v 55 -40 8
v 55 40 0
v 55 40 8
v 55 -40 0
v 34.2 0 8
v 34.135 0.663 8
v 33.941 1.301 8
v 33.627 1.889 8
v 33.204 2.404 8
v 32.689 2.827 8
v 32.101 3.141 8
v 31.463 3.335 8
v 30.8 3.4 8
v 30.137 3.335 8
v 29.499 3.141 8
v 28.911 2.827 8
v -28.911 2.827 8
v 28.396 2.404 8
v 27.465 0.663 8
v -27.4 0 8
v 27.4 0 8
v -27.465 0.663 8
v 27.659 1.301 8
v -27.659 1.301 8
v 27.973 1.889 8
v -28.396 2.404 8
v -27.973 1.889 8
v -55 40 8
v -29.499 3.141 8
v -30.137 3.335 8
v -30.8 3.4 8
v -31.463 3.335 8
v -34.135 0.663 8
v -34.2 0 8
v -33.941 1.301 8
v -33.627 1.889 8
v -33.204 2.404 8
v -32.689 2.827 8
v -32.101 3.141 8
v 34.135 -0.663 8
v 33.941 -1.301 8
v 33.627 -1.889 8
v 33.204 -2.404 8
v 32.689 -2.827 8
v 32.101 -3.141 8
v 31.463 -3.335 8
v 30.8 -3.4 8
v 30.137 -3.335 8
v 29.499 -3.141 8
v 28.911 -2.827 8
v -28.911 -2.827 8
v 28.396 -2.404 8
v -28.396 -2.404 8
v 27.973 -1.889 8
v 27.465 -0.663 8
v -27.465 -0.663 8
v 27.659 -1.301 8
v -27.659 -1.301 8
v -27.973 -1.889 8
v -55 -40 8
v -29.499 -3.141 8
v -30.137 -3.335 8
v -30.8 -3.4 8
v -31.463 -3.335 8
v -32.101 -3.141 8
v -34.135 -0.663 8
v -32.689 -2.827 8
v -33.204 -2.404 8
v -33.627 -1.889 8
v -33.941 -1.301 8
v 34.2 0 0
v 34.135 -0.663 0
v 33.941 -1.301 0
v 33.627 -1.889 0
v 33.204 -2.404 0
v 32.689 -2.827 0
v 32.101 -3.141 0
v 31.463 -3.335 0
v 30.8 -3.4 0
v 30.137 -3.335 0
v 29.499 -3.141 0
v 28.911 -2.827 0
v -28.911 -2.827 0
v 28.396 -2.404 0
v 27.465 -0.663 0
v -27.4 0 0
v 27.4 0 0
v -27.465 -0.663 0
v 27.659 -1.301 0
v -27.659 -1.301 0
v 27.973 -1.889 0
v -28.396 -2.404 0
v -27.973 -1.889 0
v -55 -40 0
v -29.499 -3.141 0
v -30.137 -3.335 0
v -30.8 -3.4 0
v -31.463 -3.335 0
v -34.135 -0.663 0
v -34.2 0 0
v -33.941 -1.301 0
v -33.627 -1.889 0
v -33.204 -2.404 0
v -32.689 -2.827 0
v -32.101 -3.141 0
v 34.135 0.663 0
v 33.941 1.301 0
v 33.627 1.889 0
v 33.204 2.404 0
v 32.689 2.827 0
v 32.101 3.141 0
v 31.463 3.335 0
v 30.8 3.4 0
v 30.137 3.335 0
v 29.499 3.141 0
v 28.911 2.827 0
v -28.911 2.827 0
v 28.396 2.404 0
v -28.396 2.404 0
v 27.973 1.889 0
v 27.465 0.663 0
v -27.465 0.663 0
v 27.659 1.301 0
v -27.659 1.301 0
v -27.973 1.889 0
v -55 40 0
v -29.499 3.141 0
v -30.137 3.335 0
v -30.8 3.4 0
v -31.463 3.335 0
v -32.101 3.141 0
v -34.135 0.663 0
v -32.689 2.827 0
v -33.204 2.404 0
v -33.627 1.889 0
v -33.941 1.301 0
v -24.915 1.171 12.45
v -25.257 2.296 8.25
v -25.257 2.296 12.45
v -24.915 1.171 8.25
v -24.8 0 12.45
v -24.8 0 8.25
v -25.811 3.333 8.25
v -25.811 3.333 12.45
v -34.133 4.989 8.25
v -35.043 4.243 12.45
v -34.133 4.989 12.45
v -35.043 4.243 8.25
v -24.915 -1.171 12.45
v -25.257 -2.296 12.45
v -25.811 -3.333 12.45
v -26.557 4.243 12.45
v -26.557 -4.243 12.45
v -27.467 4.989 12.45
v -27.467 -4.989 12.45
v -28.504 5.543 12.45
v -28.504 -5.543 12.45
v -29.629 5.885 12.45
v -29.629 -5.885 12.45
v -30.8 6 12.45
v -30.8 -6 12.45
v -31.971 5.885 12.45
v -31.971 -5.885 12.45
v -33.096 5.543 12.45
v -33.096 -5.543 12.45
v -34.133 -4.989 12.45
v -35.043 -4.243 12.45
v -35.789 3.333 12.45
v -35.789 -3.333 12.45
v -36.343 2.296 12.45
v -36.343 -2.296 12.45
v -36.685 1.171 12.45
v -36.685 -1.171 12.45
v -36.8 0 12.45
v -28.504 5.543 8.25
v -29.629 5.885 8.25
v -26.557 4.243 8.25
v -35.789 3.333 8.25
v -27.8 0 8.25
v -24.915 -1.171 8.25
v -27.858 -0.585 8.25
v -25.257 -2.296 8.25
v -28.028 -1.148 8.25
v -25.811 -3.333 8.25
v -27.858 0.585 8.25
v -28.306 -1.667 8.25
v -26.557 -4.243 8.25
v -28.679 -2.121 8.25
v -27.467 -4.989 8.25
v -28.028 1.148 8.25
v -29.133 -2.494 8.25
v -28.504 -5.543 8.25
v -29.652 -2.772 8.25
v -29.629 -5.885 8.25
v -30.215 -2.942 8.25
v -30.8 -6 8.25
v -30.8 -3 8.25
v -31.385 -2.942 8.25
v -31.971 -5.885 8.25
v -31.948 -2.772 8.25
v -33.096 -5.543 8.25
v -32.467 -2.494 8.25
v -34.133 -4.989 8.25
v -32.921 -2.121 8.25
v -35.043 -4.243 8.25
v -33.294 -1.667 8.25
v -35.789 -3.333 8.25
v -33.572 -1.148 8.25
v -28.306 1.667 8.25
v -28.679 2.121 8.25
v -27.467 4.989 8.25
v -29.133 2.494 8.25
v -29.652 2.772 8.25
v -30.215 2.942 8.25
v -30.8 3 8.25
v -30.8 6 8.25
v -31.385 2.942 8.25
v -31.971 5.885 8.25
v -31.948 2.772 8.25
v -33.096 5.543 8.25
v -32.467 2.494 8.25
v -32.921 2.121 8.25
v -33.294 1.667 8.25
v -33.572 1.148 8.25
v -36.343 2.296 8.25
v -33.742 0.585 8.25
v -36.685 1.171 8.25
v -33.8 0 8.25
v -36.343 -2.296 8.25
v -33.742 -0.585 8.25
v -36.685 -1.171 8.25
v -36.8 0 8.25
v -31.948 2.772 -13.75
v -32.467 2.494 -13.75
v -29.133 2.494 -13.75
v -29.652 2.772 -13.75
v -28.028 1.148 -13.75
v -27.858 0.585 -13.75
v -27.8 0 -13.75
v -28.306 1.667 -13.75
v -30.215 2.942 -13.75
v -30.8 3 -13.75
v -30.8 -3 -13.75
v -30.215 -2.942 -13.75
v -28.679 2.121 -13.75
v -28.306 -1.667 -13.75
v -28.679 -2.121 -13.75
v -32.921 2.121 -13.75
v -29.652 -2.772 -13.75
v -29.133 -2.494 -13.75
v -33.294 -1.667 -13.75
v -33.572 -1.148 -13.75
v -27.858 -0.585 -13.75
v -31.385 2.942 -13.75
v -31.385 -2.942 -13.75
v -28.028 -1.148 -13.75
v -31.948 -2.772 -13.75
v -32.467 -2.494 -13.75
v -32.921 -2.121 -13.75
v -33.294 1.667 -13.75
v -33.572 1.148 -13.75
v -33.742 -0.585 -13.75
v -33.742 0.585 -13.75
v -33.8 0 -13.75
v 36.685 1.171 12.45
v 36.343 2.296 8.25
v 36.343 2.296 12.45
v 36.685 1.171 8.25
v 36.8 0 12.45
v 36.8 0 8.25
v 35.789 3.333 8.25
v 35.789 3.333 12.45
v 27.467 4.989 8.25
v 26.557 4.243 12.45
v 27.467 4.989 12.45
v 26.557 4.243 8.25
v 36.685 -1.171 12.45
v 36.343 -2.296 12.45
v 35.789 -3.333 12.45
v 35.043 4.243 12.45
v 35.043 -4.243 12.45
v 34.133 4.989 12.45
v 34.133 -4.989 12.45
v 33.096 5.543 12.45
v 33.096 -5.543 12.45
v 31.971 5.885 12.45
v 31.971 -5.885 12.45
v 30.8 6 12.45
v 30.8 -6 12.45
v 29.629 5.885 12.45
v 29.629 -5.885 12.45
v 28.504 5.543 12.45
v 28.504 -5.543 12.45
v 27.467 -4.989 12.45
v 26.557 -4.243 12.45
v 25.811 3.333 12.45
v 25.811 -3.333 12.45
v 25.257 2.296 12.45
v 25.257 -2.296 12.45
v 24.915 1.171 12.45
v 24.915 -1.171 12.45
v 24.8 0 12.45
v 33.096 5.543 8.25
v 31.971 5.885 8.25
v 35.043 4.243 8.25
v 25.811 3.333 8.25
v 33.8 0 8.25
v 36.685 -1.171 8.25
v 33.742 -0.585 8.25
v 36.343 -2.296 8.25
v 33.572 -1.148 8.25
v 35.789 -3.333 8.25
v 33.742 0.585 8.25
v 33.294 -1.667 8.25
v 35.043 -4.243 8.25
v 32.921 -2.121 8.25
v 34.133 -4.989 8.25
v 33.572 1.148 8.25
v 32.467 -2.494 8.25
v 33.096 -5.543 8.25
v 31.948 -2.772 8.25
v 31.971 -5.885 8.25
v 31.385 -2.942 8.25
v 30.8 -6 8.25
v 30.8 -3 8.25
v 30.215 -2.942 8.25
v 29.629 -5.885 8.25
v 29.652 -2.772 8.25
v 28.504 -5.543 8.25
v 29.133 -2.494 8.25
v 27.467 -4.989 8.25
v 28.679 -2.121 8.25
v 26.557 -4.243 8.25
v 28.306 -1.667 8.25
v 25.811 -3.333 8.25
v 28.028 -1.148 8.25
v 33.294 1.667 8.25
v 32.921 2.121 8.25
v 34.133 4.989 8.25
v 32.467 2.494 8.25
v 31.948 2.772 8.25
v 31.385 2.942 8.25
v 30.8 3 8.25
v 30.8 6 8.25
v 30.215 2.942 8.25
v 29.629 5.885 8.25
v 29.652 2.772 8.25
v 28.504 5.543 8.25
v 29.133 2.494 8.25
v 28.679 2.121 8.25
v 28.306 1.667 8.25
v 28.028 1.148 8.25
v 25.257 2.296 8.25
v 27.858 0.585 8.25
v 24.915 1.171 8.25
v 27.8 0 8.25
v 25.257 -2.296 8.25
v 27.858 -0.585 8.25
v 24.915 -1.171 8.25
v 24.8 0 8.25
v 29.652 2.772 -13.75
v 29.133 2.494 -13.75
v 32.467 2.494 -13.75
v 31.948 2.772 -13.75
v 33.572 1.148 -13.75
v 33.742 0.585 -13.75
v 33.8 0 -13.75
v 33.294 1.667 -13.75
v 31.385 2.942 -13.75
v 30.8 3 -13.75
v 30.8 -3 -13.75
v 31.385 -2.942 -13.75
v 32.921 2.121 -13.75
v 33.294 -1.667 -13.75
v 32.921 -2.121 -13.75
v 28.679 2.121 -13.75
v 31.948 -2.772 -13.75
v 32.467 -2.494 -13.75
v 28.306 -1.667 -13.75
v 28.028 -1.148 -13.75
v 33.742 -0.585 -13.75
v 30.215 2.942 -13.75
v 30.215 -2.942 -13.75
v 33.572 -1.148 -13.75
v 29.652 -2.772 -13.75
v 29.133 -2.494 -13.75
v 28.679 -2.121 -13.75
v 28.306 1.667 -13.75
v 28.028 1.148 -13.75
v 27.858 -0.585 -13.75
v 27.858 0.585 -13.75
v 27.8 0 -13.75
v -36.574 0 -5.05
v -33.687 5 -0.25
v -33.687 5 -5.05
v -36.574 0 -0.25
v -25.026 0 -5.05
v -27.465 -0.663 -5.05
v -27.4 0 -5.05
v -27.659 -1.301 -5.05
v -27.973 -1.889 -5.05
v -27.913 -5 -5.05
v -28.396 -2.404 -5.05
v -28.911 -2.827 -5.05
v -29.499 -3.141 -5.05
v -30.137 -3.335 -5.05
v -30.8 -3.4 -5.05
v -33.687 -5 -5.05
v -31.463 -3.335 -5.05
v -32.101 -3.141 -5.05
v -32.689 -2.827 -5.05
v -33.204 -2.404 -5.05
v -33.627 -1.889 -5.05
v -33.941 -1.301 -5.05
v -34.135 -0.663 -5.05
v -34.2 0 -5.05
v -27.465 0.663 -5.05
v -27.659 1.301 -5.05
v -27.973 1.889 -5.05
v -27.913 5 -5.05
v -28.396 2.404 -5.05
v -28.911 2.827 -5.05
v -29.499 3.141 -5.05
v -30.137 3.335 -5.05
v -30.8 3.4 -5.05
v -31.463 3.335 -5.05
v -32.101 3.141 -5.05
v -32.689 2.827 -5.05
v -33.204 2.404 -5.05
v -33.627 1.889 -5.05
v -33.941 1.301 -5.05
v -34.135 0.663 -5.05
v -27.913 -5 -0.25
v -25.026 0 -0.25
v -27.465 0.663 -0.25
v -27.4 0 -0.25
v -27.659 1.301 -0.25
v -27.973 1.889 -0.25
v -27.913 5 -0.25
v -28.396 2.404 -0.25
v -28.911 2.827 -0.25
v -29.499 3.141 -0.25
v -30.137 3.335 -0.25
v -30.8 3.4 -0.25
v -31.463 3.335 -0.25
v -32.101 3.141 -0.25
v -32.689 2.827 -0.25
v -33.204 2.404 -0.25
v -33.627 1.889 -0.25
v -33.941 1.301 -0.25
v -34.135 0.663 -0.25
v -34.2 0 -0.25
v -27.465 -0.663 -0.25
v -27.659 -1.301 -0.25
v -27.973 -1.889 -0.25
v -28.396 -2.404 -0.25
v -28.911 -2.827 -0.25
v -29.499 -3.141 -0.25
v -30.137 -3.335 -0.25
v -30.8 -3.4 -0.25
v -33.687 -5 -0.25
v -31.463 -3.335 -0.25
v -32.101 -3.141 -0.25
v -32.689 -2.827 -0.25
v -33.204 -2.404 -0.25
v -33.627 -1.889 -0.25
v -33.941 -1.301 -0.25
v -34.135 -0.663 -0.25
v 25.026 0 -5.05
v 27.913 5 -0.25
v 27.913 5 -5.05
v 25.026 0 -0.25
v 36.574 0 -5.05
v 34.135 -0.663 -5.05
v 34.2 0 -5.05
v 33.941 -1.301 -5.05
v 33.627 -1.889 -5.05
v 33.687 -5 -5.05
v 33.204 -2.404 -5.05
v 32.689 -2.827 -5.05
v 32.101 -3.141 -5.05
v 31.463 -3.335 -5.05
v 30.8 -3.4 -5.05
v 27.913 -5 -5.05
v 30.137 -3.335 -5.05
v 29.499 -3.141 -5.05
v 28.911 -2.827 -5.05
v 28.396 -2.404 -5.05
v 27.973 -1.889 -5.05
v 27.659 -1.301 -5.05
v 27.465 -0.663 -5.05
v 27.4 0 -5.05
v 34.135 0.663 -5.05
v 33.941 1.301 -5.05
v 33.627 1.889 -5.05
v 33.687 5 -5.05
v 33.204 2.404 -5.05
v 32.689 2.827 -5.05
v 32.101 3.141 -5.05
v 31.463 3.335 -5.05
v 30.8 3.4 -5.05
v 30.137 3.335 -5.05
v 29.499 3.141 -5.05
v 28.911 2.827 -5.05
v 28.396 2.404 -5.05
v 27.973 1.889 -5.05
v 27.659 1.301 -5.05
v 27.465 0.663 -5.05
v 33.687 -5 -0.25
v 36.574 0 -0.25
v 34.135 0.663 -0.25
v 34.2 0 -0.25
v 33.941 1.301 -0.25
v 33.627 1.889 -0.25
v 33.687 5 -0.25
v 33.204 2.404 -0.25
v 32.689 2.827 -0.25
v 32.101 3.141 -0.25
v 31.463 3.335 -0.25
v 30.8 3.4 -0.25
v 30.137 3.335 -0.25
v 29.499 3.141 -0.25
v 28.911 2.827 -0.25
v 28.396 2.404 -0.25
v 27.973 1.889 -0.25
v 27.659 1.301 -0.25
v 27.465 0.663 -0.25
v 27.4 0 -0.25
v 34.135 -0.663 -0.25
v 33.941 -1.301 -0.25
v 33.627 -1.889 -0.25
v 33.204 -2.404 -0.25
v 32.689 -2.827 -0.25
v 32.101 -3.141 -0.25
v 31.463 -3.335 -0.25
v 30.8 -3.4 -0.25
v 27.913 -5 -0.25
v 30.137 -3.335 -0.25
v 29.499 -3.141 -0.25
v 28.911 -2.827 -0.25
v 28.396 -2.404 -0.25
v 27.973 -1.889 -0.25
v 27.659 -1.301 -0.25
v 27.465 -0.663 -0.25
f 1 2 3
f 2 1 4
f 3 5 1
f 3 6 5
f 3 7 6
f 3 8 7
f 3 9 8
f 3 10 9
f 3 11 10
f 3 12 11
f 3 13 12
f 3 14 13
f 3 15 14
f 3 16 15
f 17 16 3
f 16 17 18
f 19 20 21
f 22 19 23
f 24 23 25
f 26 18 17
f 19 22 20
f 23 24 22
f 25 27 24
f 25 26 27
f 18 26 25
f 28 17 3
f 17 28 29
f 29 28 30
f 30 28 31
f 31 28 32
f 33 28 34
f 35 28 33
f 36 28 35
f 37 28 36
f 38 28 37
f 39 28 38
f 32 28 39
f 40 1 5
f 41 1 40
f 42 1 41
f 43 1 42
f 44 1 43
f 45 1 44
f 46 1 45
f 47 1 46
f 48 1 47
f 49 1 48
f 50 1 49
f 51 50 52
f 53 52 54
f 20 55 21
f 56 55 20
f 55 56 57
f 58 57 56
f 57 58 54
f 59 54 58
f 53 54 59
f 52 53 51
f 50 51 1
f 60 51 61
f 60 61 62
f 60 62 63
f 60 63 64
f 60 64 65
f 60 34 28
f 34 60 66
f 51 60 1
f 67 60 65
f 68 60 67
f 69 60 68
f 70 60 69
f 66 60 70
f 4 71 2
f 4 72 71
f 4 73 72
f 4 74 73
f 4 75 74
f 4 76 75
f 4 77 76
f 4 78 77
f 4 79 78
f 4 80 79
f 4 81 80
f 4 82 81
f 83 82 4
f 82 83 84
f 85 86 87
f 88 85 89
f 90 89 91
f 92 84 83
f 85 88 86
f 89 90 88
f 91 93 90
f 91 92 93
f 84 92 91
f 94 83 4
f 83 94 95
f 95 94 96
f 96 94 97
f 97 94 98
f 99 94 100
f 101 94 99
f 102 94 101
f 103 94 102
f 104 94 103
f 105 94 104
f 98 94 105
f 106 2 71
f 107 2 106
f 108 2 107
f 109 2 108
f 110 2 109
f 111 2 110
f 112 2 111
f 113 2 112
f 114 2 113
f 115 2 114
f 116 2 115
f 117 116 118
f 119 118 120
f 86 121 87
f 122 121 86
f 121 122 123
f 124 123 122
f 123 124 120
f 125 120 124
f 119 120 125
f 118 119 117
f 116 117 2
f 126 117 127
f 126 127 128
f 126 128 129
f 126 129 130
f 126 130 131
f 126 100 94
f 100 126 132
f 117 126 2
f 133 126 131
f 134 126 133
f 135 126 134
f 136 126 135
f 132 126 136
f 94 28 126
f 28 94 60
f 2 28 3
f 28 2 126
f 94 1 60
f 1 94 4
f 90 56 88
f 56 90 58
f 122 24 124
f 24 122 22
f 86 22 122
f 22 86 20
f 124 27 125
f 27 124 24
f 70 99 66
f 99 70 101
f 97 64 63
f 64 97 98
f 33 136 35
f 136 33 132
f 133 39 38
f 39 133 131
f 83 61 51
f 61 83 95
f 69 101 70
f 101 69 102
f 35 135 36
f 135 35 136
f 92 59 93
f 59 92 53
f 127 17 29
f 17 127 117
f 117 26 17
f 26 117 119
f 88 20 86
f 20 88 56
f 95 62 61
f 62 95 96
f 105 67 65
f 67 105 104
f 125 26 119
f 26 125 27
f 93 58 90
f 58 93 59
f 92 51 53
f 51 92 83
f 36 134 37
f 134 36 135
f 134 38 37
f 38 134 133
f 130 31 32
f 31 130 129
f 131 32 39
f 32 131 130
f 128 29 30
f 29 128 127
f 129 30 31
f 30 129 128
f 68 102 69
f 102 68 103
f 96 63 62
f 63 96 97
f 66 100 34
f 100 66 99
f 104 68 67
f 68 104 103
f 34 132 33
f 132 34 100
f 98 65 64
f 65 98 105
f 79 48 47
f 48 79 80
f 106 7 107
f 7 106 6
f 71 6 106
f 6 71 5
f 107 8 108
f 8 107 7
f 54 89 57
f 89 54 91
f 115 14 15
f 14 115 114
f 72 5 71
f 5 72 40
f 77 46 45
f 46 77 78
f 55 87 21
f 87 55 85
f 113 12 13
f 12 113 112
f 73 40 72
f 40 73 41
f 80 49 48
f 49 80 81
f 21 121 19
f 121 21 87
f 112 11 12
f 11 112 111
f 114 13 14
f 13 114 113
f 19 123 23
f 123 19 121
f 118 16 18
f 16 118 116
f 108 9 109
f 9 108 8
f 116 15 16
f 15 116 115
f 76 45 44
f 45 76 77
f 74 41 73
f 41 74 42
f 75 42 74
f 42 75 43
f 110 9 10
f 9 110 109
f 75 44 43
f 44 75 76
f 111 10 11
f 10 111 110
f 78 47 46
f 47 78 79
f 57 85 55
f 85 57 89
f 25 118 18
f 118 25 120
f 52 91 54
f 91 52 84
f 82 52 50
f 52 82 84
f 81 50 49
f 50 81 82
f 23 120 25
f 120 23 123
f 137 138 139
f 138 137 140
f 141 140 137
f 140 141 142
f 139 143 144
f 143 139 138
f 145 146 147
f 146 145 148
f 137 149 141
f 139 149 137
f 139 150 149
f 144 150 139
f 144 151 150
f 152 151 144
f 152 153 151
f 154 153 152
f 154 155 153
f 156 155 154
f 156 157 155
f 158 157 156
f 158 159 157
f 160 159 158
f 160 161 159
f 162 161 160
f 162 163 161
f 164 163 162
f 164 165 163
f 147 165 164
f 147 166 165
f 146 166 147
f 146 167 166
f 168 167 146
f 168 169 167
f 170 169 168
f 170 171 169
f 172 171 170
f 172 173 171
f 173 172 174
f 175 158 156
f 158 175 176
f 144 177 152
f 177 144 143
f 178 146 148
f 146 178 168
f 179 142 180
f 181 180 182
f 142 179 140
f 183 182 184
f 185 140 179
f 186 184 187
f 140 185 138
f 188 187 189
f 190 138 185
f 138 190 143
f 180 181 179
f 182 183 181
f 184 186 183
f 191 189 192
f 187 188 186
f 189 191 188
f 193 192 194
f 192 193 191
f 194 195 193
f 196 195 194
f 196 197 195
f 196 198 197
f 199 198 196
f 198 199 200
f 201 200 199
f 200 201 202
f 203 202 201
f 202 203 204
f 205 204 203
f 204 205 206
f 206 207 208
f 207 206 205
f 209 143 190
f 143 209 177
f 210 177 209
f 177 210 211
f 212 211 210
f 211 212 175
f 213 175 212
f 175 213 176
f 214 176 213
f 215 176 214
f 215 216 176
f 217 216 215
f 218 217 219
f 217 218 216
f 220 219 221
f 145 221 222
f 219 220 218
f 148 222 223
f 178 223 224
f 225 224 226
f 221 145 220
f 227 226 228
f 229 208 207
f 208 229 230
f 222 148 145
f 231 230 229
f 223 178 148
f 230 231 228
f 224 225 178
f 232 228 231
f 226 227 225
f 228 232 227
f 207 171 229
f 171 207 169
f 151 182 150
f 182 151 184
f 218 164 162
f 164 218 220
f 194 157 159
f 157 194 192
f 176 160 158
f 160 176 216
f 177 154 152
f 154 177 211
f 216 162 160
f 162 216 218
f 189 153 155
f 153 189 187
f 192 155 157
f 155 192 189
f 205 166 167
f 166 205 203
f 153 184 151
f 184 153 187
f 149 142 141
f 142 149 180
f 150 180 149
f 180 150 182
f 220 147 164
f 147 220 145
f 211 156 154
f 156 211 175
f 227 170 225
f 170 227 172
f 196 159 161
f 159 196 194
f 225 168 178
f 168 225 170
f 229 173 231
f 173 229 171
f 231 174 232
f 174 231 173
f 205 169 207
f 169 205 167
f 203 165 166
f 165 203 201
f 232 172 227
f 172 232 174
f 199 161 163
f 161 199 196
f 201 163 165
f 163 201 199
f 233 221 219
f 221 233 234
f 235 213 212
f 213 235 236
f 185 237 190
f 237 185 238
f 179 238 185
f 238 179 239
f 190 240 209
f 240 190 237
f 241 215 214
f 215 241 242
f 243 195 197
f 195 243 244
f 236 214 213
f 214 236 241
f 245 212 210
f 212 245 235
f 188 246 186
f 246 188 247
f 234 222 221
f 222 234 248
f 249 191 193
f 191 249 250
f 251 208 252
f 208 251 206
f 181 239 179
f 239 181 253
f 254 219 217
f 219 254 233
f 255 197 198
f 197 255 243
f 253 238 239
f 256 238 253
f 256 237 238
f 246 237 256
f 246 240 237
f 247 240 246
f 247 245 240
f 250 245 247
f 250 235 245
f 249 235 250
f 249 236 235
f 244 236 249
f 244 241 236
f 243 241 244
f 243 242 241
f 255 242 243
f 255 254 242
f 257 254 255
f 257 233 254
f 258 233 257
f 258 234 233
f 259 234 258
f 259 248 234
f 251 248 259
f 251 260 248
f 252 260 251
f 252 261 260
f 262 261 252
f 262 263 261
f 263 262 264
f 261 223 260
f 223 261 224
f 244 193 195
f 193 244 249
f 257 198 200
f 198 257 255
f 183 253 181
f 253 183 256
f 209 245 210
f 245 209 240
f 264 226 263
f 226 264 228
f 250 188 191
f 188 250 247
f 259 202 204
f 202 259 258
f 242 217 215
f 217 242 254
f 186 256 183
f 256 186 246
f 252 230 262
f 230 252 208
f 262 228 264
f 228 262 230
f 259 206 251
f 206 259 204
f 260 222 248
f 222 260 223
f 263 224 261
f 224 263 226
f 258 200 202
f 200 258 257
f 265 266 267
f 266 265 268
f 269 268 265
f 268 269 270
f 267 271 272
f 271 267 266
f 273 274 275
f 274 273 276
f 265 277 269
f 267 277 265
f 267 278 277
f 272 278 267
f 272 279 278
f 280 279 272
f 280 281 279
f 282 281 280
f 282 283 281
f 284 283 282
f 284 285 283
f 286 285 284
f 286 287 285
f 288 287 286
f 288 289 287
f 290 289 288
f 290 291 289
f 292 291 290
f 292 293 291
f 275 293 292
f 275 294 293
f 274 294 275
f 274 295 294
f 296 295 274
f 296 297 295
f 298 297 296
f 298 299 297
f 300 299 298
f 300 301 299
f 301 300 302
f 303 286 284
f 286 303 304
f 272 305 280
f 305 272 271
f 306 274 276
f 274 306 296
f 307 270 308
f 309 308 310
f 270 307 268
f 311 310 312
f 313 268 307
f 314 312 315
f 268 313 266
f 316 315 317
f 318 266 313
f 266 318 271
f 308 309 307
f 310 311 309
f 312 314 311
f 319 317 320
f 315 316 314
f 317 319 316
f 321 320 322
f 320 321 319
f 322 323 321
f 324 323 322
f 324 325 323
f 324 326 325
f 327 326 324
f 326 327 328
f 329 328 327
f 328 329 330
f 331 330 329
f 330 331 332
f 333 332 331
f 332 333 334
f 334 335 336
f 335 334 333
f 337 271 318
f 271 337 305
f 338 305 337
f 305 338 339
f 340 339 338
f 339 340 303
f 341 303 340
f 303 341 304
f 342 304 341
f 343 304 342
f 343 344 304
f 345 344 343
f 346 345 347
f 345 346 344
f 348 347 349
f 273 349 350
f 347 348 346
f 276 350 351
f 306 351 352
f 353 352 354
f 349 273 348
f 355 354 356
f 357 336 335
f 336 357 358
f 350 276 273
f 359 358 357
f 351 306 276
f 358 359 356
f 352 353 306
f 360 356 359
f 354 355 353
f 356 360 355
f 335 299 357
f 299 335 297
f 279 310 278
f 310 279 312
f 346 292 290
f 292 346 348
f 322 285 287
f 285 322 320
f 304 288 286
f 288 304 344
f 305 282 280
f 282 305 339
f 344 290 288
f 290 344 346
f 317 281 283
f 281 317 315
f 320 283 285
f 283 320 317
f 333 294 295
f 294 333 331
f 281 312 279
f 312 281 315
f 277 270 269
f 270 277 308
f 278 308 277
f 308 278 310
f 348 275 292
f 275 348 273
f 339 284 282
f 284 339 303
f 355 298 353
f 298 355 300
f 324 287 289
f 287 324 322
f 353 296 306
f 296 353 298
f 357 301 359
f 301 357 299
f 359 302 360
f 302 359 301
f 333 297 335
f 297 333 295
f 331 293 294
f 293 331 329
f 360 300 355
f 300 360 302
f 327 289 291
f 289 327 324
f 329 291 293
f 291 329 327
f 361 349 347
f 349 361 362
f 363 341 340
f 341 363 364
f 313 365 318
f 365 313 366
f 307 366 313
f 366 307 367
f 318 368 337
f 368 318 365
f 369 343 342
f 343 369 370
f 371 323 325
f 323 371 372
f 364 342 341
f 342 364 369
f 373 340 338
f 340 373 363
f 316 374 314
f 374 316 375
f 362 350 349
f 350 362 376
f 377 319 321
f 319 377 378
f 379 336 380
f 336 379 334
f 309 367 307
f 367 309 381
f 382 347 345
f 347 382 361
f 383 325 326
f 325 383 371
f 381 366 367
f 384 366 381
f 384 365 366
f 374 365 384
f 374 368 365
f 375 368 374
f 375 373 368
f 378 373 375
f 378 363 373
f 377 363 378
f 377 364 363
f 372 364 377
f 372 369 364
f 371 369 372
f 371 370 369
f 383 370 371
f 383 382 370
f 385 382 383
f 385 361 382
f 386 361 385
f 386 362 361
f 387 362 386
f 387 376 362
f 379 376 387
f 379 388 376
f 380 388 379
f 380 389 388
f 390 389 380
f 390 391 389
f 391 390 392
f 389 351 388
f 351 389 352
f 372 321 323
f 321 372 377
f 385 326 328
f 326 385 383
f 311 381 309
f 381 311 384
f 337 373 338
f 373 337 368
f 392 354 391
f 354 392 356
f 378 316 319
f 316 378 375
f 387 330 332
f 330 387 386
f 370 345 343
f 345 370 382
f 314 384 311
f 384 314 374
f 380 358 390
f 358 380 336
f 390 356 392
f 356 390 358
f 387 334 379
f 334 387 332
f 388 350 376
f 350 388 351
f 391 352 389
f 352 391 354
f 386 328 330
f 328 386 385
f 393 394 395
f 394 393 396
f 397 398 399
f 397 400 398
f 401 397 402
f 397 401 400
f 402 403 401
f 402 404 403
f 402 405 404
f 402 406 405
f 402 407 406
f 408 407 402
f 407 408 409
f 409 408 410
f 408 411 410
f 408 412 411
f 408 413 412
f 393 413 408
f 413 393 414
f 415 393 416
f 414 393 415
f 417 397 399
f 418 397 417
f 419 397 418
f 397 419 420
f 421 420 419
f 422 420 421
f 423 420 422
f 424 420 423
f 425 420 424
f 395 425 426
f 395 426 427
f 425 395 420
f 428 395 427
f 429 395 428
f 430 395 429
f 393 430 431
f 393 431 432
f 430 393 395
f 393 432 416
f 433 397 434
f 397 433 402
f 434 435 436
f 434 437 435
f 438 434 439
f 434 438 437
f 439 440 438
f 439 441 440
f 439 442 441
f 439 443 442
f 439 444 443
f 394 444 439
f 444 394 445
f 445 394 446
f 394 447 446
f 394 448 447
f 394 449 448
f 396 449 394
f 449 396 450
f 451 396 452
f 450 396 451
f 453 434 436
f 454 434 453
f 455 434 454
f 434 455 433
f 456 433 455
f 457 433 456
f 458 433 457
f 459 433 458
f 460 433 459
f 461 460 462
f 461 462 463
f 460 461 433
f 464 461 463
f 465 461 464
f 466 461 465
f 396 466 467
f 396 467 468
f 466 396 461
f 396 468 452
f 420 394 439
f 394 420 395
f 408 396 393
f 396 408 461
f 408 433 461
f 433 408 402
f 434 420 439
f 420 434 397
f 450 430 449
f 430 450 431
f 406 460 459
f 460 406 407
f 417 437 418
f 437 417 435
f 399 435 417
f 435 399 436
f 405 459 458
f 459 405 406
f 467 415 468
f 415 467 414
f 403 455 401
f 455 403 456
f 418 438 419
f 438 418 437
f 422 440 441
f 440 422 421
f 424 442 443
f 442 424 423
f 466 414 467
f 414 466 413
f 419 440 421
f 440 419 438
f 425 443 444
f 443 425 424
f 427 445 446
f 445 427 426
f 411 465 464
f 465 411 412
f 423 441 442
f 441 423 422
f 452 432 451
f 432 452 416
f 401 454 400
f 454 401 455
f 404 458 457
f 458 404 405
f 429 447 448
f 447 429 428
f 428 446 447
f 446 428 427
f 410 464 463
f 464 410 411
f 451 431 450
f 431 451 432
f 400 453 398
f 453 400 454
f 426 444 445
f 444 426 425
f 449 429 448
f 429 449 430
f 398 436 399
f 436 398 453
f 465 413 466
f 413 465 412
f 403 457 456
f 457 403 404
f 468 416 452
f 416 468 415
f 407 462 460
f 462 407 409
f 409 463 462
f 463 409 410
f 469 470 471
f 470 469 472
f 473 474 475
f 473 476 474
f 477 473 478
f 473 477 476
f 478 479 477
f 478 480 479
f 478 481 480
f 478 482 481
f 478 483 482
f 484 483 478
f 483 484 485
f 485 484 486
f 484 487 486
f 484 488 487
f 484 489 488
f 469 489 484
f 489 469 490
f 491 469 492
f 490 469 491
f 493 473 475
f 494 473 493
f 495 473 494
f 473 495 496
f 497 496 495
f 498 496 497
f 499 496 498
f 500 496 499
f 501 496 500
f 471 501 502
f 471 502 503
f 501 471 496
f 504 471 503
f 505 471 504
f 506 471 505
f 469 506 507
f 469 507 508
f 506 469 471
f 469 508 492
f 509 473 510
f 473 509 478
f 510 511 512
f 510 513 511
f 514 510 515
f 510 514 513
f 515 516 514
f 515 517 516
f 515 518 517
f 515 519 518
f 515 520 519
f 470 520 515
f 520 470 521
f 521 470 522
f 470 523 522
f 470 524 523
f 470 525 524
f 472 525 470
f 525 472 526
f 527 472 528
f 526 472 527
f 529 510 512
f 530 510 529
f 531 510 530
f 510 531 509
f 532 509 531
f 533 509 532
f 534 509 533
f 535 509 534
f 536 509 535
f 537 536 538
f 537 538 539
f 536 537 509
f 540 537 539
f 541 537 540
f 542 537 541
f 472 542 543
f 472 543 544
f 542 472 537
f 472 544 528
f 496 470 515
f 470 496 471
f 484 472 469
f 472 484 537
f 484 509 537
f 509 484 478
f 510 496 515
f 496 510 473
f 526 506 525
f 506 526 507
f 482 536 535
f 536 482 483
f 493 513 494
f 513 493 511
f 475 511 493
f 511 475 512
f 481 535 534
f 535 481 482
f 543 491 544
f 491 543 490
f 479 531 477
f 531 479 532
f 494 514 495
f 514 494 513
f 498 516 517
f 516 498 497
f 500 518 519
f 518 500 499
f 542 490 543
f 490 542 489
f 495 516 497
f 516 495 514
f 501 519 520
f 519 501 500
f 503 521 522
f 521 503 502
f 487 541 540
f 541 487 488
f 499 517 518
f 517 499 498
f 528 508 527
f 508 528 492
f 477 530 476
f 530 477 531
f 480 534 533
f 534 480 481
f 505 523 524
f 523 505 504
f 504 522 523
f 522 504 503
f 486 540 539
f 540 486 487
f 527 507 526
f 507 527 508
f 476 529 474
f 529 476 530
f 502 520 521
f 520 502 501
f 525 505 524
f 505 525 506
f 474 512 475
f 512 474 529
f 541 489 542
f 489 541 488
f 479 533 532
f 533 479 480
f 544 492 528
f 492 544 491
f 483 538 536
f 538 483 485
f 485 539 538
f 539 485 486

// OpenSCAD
$fn = 32;

// ------------------------------------------------------------------------
// Bolted plate: 110 x 80 x 8 mm plate, 2 fasteners
// Every part is its own module, assembly() places them once.
// ------------------------------------------------------------------------

// --- part 1 ---
module plate() {
  difference() {
    translate([-55, -40, 0]) cube([110, 80, 8]);
    translate([-30.8, 0, -1]) cylinder(h = 10, d = 6.8);
    translate([30.8, 0, -1]) cylinder(h = 10, d = 6.8);
  }
}

// --- part 2 ---
module bolt1() {
  cylinder(h = 4.2, d = 12);
  translate([0, 0, -22]) cylinder(h = 22, d = 6);
}

// --- part 3 ---
module bolt2() {
  cylinder(h = 4.2, d = 12);
  translate([0, 0, -22]) cylinder(h = 22, d = 6);
}

// --- part 4 ---
module nut1() {
  difference() {
    linear_extrude(height = 4.8) polygon(points = [[5.774, 0], [2.887, 5], [-2.887, 5], [-5.774, 0], [-2.887, -5], [2.887, -5]]);
    translate([0, 0, -1]) cylinder(h = 6.8, d = 6.8);
  }
}

// --- part 5 ---
module nut2() {
  difference() {
    linear_extrude(height = 4.8) polygon(points = [[5.774, 0], [2.887, 5], [-2.887, 5], [-5.774, 0], [-2.887, -5], [2.887, -5]]);
    translate([0, 0, -1]) cylinder(h = 6.8, d = 6.8);
  }
}

// --- assembly ---
module assembly() {
  translate([0, 0, 0]) rotate([0, 0, 0]) plate();
  translate([-30.8, 0, 8.25]) rotate([0, 0, 0]) bolt1();
  translate([30.8, 0, 8.25]) rotate([0, 0, 0]) bolt2();
  translate([-30.8, 0, -5.05]) rotate([0, 0, 0]) nut1();
  translate([30.8, 0, -5.05]) rotate([0, 0, 0]) nut2();
}

assembly();
